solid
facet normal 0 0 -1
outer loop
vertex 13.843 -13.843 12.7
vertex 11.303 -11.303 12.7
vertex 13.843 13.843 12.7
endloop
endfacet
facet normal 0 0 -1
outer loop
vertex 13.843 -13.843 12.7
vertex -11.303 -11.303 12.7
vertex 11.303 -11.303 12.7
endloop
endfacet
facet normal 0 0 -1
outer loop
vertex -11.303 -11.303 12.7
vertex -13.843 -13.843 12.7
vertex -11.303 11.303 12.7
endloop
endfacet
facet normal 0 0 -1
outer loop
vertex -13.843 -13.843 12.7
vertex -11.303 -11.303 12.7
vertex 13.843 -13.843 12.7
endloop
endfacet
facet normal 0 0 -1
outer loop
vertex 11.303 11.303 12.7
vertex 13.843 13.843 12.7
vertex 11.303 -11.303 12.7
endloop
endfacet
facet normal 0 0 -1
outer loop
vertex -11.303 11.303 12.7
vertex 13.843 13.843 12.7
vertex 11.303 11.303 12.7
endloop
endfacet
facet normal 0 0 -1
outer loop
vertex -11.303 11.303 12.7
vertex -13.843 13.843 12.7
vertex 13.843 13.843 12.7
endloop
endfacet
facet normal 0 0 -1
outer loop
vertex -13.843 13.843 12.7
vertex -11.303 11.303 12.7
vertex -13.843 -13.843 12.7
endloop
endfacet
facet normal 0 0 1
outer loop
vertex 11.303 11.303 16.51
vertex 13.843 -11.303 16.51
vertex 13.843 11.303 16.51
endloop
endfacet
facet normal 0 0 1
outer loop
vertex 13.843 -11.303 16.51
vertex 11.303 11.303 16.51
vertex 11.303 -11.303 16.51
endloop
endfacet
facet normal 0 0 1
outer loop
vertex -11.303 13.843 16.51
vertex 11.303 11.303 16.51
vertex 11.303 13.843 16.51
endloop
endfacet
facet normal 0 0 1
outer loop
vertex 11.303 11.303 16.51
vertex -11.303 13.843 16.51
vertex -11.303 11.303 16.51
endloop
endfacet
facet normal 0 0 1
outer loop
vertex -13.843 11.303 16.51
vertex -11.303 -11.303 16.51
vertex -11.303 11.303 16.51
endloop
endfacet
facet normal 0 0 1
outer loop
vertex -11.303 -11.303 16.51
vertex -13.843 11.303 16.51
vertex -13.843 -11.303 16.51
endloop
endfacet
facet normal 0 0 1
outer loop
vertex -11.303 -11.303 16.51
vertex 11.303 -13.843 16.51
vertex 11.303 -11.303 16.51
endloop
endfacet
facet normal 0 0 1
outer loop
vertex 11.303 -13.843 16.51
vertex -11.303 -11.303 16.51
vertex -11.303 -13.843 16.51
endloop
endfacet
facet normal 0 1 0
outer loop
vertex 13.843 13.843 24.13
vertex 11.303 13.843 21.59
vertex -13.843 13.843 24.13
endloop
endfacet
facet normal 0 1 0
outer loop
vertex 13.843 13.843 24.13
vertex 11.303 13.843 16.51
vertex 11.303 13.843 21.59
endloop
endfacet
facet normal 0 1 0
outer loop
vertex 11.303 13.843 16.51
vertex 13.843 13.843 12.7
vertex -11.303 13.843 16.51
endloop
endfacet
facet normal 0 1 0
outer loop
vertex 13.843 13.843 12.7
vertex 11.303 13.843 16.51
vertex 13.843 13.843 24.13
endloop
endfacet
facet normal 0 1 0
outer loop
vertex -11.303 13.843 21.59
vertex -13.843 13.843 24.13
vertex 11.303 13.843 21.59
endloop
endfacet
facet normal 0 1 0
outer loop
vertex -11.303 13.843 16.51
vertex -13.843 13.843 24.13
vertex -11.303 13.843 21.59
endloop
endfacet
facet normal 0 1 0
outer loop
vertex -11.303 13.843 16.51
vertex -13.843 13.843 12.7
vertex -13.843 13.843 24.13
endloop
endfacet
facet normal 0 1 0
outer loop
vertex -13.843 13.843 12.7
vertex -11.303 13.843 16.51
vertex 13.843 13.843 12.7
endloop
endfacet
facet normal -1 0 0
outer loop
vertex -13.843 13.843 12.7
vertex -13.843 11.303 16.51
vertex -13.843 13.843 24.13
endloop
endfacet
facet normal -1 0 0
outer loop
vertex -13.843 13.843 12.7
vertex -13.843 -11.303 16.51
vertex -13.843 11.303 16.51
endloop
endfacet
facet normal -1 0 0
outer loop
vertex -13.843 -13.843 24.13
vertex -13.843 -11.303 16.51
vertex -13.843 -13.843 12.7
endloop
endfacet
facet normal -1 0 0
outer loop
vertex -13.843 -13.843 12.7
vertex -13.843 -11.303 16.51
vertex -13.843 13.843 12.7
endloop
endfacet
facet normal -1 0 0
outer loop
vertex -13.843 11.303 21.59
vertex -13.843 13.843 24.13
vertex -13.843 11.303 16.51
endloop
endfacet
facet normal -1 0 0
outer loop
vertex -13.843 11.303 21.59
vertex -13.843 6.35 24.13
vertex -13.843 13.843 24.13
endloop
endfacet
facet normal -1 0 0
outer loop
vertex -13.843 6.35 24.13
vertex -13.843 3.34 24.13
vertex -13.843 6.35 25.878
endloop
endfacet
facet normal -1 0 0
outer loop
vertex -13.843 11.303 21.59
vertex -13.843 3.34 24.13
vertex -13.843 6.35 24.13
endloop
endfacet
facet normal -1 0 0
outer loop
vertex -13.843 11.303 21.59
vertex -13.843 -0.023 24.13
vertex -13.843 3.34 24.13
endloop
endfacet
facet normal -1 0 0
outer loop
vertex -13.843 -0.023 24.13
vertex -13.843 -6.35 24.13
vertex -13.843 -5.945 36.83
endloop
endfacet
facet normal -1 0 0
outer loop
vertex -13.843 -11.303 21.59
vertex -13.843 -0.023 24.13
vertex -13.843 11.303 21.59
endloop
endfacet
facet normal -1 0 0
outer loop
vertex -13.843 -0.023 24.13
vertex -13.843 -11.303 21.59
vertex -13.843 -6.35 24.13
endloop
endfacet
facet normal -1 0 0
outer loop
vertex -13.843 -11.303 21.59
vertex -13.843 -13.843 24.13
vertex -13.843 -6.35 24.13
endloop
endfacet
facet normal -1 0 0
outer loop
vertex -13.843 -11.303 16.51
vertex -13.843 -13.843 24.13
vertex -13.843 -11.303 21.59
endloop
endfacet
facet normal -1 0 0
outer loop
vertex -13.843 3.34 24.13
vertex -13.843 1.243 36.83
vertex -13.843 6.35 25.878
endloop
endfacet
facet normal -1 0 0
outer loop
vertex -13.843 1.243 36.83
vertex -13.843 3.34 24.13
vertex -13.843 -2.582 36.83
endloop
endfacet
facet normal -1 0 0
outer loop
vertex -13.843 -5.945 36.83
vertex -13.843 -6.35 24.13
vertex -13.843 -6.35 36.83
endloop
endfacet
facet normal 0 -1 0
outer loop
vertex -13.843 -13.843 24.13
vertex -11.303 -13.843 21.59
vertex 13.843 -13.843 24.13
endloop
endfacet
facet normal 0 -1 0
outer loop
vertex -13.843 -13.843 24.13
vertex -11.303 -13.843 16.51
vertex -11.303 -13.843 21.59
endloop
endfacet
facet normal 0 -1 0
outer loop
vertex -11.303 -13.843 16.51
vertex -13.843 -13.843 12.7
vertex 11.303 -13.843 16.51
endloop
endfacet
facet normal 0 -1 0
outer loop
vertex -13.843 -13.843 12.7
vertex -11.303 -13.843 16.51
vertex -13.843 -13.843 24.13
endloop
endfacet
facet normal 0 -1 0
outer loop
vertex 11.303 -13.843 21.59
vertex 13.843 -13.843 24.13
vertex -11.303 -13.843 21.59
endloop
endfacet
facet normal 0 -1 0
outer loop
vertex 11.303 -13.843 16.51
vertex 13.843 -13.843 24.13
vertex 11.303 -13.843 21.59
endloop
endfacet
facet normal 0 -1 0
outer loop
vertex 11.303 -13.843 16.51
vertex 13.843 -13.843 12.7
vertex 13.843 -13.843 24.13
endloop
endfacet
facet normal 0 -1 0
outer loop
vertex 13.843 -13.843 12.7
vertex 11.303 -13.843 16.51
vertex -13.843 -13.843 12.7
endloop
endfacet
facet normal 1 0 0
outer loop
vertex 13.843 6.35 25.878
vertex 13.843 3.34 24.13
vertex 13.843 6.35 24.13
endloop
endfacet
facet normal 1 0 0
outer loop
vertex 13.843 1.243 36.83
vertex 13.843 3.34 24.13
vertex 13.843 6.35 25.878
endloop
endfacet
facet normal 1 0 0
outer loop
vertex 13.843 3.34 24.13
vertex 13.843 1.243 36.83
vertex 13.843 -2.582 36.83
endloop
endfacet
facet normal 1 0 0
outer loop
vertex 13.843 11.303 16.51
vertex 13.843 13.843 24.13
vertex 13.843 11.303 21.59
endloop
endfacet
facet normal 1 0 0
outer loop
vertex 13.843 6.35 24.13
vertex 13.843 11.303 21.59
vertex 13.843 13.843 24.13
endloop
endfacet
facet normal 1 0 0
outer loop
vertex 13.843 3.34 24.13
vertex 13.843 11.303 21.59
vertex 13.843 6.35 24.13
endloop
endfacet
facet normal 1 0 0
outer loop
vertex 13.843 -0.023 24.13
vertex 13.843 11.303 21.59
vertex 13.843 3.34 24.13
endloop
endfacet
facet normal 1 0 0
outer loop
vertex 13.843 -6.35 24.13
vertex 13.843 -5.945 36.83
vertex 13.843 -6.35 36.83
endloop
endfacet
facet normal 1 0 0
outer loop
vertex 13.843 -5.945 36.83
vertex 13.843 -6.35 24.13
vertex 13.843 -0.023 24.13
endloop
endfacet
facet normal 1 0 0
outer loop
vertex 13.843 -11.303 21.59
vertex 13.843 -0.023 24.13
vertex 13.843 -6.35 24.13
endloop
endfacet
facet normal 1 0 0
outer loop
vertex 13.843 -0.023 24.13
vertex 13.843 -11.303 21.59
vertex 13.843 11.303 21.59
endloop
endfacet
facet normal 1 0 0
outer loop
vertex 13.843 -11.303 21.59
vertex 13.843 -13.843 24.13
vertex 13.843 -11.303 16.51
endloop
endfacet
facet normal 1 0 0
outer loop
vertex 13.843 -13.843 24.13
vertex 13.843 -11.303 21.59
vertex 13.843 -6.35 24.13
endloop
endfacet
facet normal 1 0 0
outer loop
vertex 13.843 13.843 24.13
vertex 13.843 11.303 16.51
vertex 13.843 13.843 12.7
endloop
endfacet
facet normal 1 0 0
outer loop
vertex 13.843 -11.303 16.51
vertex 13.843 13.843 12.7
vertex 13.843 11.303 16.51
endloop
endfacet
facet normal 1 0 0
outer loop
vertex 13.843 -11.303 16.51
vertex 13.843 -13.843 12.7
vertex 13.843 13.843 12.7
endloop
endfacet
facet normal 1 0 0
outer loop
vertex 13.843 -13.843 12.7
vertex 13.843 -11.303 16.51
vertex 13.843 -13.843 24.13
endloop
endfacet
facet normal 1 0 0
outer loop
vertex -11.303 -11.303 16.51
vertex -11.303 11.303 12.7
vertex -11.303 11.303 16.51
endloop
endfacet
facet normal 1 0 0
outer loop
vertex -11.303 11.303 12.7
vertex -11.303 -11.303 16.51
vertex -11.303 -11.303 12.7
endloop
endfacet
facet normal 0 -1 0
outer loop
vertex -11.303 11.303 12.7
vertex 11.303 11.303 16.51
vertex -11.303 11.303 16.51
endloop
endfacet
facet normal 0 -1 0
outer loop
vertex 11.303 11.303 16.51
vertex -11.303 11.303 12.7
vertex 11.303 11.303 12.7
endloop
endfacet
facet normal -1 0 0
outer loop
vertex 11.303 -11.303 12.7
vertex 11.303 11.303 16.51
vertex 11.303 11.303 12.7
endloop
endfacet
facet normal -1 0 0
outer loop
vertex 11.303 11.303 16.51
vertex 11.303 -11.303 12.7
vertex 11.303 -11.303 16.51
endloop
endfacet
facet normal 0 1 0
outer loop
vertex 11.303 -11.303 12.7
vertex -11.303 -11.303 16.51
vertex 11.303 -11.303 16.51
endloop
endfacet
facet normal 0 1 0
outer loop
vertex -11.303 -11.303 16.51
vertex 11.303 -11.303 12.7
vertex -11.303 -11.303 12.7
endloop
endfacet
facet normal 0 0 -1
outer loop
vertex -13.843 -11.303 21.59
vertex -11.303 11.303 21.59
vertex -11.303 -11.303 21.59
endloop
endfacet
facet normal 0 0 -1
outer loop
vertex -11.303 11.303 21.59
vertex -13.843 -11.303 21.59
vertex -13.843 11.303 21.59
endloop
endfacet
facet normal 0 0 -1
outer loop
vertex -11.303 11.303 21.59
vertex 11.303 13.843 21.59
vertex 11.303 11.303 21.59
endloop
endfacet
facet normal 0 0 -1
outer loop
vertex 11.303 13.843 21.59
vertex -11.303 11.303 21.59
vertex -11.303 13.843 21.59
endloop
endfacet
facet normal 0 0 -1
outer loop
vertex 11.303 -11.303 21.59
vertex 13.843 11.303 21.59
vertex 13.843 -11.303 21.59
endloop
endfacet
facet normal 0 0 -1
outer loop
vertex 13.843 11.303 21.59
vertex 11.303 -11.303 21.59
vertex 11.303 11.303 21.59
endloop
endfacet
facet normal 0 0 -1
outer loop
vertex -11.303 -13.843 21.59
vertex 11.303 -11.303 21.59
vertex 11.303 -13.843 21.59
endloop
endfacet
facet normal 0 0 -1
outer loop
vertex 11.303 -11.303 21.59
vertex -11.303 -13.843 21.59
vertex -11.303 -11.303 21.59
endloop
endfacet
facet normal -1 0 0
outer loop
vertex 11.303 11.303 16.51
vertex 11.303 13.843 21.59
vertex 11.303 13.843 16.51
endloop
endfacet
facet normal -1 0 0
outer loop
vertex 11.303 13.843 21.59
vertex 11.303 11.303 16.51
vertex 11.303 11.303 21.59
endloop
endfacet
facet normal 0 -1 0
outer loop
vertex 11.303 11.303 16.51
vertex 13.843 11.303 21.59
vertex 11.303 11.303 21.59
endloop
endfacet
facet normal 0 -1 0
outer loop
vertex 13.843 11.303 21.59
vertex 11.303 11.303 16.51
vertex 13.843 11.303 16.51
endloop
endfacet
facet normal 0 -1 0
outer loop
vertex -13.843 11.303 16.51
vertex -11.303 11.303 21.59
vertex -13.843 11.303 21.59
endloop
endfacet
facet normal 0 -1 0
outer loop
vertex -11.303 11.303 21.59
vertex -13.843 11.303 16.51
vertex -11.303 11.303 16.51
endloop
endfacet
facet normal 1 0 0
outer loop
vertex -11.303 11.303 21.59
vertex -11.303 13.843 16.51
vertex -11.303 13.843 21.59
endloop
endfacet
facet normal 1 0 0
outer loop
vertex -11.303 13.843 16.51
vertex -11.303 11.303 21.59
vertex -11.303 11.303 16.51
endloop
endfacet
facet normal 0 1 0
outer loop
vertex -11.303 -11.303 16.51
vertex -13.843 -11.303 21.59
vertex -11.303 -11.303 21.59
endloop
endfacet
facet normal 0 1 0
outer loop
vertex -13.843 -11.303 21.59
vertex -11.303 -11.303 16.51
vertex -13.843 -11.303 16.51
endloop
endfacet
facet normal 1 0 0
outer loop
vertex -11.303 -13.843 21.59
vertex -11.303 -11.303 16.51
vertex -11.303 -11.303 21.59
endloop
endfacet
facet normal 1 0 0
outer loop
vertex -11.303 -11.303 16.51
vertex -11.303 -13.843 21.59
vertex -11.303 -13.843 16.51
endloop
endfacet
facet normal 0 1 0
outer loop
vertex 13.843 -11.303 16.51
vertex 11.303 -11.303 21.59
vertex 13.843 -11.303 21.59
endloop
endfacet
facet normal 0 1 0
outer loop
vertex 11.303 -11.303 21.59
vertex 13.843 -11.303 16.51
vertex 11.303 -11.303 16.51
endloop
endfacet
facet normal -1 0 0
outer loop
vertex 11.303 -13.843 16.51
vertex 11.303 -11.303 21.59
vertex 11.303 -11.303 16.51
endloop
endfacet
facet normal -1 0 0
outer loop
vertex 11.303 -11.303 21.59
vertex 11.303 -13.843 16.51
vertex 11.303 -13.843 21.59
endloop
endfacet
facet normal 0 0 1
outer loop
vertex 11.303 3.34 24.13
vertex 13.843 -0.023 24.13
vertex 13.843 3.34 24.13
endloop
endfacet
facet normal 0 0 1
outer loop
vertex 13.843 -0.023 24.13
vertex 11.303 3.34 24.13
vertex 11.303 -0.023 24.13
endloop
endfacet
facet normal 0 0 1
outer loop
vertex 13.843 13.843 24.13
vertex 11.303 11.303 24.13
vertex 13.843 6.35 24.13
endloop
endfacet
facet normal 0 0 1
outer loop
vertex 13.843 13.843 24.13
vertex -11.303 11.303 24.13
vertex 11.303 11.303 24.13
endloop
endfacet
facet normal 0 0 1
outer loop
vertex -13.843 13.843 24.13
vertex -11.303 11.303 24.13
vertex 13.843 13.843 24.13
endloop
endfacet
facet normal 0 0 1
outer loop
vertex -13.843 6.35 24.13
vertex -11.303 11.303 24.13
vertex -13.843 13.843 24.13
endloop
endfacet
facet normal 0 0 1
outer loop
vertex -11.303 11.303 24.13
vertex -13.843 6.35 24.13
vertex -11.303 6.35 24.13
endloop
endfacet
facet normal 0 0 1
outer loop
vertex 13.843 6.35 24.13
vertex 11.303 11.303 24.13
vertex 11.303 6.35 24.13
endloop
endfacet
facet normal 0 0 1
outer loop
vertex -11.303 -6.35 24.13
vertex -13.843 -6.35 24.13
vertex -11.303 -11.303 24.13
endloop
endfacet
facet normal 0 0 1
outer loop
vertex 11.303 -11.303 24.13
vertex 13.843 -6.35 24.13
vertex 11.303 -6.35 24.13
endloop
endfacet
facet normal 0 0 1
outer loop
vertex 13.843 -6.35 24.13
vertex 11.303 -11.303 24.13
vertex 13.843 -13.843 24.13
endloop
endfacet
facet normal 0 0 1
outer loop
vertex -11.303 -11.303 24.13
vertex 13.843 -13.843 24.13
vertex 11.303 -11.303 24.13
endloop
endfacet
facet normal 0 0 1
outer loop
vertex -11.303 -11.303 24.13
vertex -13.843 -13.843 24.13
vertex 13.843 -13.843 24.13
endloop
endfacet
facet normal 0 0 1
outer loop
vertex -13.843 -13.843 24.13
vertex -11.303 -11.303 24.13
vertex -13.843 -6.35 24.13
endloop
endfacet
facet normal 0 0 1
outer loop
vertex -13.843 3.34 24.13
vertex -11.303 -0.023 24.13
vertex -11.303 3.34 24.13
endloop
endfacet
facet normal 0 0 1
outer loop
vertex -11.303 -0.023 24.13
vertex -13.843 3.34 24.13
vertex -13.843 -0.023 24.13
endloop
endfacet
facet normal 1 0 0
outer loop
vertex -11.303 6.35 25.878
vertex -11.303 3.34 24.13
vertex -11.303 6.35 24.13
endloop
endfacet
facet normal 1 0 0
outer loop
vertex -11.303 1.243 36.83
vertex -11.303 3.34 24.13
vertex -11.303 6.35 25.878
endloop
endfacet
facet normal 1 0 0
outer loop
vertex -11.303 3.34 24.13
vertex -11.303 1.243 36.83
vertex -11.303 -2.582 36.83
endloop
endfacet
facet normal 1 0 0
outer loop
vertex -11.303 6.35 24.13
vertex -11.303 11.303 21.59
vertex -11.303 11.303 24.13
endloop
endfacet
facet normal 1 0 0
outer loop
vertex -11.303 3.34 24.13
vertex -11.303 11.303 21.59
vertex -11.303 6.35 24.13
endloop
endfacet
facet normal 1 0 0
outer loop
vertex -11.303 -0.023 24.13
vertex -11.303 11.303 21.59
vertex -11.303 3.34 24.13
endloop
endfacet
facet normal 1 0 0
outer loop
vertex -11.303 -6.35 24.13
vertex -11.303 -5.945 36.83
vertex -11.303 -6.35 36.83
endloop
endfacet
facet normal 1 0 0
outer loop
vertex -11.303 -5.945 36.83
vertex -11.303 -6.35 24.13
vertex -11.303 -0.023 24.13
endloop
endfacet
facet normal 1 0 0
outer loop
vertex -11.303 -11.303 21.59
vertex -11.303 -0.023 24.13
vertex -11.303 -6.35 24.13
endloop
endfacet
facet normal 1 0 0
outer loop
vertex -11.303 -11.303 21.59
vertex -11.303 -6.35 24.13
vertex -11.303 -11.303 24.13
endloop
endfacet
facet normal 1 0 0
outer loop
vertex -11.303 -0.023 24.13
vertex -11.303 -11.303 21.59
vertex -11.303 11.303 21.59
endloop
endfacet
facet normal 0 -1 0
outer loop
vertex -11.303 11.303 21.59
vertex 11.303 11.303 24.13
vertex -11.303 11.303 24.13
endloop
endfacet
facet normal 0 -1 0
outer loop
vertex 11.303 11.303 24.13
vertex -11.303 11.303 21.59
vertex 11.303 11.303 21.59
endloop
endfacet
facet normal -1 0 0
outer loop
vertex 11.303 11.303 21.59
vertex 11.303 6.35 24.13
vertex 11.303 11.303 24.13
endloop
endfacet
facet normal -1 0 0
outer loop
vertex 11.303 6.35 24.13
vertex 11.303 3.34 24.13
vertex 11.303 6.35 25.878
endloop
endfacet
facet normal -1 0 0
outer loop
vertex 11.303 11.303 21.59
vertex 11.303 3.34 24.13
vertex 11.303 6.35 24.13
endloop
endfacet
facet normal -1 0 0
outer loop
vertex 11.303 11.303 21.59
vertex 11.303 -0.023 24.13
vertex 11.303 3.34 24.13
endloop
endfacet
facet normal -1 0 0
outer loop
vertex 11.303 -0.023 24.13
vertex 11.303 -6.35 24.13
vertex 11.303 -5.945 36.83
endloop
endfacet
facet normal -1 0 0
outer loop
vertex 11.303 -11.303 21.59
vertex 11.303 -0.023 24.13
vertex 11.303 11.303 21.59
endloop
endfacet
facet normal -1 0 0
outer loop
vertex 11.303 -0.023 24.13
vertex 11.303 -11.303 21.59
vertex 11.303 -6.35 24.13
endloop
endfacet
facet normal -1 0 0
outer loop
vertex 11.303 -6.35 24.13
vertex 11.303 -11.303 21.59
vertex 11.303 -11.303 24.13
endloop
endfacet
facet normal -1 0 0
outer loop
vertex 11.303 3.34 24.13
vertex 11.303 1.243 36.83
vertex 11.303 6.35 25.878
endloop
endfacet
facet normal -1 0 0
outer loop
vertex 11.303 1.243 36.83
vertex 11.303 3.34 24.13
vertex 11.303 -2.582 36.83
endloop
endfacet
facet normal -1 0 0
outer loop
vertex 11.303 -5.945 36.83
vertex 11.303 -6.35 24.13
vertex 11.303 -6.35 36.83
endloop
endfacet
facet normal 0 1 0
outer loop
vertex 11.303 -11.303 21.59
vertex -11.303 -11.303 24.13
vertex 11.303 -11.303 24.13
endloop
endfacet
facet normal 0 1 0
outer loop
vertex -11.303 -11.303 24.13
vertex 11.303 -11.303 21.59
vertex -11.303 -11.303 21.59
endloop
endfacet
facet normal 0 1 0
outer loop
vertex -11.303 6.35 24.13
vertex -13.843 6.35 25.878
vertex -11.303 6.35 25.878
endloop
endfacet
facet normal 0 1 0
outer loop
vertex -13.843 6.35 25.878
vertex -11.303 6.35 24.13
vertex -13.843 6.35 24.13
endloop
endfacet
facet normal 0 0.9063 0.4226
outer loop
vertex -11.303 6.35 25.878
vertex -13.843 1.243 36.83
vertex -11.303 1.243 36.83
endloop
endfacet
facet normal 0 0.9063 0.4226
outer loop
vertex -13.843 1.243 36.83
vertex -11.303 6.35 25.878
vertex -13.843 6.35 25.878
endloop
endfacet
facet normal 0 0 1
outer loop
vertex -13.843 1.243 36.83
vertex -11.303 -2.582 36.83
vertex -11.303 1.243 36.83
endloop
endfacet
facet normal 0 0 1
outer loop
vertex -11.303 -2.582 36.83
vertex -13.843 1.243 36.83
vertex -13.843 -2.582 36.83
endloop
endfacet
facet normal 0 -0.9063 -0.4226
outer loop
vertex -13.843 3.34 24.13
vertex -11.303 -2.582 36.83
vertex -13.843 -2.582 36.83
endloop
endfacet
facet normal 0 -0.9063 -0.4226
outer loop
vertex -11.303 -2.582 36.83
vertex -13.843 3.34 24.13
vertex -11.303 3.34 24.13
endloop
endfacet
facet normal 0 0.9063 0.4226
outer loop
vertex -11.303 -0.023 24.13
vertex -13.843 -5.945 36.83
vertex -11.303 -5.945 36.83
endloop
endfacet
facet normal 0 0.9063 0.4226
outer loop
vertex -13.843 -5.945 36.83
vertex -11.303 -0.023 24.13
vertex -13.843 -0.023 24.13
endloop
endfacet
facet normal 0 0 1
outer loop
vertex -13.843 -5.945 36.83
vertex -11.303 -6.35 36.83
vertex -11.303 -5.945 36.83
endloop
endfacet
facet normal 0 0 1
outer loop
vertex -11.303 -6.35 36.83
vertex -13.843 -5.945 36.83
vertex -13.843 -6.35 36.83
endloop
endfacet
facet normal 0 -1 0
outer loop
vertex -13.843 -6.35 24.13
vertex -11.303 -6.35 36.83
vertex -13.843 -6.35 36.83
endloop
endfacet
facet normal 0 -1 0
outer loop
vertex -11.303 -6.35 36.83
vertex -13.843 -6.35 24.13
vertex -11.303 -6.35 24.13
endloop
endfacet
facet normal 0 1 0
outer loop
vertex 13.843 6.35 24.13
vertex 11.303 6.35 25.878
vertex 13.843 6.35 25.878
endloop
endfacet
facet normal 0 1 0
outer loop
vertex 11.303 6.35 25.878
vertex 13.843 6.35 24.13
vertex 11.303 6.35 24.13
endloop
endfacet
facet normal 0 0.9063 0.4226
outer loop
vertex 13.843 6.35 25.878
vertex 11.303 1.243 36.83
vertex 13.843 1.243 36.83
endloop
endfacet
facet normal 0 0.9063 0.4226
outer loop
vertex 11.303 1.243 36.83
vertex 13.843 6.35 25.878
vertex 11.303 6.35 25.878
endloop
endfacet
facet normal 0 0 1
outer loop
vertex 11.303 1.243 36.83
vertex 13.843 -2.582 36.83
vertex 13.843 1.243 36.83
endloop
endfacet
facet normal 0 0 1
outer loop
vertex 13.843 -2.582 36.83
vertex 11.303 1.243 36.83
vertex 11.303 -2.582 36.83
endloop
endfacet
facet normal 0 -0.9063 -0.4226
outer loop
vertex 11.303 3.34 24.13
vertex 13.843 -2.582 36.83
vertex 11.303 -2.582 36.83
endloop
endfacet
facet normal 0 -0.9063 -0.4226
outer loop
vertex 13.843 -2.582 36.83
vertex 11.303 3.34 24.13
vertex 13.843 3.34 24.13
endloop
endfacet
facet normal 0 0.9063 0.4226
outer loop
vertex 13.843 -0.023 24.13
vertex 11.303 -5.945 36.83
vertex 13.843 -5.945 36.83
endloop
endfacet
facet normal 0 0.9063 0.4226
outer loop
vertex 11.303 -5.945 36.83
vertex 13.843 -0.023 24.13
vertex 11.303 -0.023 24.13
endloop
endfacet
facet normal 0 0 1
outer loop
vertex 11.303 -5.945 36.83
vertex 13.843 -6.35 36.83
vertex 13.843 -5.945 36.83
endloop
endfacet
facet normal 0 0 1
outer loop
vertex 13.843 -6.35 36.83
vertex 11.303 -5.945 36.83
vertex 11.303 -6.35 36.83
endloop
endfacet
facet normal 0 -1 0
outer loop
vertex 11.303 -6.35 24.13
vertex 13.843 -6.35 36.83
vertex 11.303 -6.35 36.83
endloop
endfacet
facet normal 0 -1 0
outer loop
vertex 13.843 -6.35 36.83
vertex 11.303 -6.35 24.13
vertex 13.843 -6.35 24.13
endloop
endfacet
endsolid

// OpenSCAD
ViewScale = [0.0254, 0.0254, 0.0254];

LEDTILT=25;

module onesupport()
{
    difference() {
    circle(500, $fn=96);
//    circle(400, $fn=96);
//    }
//
//    difference() {
//    circle(200, $fn=96);
   circle(175/2, $fn=96); }

//    difference() {
//        union() {
//            square([100, 1000], center=true);
//            rotate([0, 0, 90])
//            square([100, 1000], center=true);
//        }
//        circle(175/2, $fn=96);
//    }
}

module support()
{
    linear_extrude(100) {
        onesupport();
        translate([2000, 0, 0])
        onesupport();
        difference() {
            square([2000, 500]);
            circle(500, $fn=96);
            translate([2000, 0, 0])
            circle(500, $fn=96);
            translate([700, -10, 0])
            square([600, 300]);
        }
    }
}

module cutsupport()
{
    rotate([0, 90, 0])
    linear_extrude(100) {
        difference() {
        square([500, 500], center=true);
        translate([110, 0, 0])
        rotate([0, 0, LEDTILT])
        translate([-90, 0, 0])
        square([800, 120], center=true);
        rotate([0, 0, LEDTILT])
        translate([0, 300, 0])
        square([600, 300], center=true);
        }
    }
}

module ledmount()
{
    // full square
    translate([0, 0, 500])
    linear_extrude(150)
    difference() {
        square([1080+10, 1080+10], center=true);
        square([880+10, 880+10], center=true);
        *translate([0, 450, 0])
        square([200, 200], center=true);
    }

    // supports
    move = 940/2+25;
    translate([0, 0, 150+500]) 
    linear_extrude(200) {
        translate([move, move, 0])
        square([100, 100], center=true);
        translate([-move, move, 0])
        square([100, 100], center=true);
        translate([-move, -move, 0])
        square([100, 100], center=true);
        translate([move, -move, 0])
        square([100, 100], center=true);
        *translate([-150, move, 0])
        square([100, 100], center=true);
        *translate([150, move, 0])
        square([100, 100], center=true);
    }

    // cutout square
    translate([0, 0, 350+500])
    linear_extrude(100)
    difference() {
        square([1080+10, 1080+10], center=true);
        square([880+10, 880+10], center=true);
        //translate([0, 450, 0])
        //square([200, 200], center=true);
    }

    // long supports
    translate([-move-50,0, 450+500+250]) 
    cutsupport();
    translate([move-50,0, 450+500+250]) 
    cutsupport();
//    linear_extrude(500) {
//        translate([move, -100, 0])
//        square([100, 500], center=true);
//        translate([-move, -100, 0])
//        square([100, 500], center=true);
//    }

    *translate([0, -move+195, 800+500])
    linear_extrude(600)
    square([1080+10, 100], center=true);
}

module twopieces()
{
    translate([-1000, 0, 0])
    support();
    rotate([-LEDTILT, 0, 0])
    translate([0, -1200, 0])
    rotate([-90, 0, 0])
    ledmount();
}

module onepiece()
{
    //support();
    //translate([0, -1200, 0])
    ledmount();
}

scale(ViewScale)
{
    onepiece();
}
